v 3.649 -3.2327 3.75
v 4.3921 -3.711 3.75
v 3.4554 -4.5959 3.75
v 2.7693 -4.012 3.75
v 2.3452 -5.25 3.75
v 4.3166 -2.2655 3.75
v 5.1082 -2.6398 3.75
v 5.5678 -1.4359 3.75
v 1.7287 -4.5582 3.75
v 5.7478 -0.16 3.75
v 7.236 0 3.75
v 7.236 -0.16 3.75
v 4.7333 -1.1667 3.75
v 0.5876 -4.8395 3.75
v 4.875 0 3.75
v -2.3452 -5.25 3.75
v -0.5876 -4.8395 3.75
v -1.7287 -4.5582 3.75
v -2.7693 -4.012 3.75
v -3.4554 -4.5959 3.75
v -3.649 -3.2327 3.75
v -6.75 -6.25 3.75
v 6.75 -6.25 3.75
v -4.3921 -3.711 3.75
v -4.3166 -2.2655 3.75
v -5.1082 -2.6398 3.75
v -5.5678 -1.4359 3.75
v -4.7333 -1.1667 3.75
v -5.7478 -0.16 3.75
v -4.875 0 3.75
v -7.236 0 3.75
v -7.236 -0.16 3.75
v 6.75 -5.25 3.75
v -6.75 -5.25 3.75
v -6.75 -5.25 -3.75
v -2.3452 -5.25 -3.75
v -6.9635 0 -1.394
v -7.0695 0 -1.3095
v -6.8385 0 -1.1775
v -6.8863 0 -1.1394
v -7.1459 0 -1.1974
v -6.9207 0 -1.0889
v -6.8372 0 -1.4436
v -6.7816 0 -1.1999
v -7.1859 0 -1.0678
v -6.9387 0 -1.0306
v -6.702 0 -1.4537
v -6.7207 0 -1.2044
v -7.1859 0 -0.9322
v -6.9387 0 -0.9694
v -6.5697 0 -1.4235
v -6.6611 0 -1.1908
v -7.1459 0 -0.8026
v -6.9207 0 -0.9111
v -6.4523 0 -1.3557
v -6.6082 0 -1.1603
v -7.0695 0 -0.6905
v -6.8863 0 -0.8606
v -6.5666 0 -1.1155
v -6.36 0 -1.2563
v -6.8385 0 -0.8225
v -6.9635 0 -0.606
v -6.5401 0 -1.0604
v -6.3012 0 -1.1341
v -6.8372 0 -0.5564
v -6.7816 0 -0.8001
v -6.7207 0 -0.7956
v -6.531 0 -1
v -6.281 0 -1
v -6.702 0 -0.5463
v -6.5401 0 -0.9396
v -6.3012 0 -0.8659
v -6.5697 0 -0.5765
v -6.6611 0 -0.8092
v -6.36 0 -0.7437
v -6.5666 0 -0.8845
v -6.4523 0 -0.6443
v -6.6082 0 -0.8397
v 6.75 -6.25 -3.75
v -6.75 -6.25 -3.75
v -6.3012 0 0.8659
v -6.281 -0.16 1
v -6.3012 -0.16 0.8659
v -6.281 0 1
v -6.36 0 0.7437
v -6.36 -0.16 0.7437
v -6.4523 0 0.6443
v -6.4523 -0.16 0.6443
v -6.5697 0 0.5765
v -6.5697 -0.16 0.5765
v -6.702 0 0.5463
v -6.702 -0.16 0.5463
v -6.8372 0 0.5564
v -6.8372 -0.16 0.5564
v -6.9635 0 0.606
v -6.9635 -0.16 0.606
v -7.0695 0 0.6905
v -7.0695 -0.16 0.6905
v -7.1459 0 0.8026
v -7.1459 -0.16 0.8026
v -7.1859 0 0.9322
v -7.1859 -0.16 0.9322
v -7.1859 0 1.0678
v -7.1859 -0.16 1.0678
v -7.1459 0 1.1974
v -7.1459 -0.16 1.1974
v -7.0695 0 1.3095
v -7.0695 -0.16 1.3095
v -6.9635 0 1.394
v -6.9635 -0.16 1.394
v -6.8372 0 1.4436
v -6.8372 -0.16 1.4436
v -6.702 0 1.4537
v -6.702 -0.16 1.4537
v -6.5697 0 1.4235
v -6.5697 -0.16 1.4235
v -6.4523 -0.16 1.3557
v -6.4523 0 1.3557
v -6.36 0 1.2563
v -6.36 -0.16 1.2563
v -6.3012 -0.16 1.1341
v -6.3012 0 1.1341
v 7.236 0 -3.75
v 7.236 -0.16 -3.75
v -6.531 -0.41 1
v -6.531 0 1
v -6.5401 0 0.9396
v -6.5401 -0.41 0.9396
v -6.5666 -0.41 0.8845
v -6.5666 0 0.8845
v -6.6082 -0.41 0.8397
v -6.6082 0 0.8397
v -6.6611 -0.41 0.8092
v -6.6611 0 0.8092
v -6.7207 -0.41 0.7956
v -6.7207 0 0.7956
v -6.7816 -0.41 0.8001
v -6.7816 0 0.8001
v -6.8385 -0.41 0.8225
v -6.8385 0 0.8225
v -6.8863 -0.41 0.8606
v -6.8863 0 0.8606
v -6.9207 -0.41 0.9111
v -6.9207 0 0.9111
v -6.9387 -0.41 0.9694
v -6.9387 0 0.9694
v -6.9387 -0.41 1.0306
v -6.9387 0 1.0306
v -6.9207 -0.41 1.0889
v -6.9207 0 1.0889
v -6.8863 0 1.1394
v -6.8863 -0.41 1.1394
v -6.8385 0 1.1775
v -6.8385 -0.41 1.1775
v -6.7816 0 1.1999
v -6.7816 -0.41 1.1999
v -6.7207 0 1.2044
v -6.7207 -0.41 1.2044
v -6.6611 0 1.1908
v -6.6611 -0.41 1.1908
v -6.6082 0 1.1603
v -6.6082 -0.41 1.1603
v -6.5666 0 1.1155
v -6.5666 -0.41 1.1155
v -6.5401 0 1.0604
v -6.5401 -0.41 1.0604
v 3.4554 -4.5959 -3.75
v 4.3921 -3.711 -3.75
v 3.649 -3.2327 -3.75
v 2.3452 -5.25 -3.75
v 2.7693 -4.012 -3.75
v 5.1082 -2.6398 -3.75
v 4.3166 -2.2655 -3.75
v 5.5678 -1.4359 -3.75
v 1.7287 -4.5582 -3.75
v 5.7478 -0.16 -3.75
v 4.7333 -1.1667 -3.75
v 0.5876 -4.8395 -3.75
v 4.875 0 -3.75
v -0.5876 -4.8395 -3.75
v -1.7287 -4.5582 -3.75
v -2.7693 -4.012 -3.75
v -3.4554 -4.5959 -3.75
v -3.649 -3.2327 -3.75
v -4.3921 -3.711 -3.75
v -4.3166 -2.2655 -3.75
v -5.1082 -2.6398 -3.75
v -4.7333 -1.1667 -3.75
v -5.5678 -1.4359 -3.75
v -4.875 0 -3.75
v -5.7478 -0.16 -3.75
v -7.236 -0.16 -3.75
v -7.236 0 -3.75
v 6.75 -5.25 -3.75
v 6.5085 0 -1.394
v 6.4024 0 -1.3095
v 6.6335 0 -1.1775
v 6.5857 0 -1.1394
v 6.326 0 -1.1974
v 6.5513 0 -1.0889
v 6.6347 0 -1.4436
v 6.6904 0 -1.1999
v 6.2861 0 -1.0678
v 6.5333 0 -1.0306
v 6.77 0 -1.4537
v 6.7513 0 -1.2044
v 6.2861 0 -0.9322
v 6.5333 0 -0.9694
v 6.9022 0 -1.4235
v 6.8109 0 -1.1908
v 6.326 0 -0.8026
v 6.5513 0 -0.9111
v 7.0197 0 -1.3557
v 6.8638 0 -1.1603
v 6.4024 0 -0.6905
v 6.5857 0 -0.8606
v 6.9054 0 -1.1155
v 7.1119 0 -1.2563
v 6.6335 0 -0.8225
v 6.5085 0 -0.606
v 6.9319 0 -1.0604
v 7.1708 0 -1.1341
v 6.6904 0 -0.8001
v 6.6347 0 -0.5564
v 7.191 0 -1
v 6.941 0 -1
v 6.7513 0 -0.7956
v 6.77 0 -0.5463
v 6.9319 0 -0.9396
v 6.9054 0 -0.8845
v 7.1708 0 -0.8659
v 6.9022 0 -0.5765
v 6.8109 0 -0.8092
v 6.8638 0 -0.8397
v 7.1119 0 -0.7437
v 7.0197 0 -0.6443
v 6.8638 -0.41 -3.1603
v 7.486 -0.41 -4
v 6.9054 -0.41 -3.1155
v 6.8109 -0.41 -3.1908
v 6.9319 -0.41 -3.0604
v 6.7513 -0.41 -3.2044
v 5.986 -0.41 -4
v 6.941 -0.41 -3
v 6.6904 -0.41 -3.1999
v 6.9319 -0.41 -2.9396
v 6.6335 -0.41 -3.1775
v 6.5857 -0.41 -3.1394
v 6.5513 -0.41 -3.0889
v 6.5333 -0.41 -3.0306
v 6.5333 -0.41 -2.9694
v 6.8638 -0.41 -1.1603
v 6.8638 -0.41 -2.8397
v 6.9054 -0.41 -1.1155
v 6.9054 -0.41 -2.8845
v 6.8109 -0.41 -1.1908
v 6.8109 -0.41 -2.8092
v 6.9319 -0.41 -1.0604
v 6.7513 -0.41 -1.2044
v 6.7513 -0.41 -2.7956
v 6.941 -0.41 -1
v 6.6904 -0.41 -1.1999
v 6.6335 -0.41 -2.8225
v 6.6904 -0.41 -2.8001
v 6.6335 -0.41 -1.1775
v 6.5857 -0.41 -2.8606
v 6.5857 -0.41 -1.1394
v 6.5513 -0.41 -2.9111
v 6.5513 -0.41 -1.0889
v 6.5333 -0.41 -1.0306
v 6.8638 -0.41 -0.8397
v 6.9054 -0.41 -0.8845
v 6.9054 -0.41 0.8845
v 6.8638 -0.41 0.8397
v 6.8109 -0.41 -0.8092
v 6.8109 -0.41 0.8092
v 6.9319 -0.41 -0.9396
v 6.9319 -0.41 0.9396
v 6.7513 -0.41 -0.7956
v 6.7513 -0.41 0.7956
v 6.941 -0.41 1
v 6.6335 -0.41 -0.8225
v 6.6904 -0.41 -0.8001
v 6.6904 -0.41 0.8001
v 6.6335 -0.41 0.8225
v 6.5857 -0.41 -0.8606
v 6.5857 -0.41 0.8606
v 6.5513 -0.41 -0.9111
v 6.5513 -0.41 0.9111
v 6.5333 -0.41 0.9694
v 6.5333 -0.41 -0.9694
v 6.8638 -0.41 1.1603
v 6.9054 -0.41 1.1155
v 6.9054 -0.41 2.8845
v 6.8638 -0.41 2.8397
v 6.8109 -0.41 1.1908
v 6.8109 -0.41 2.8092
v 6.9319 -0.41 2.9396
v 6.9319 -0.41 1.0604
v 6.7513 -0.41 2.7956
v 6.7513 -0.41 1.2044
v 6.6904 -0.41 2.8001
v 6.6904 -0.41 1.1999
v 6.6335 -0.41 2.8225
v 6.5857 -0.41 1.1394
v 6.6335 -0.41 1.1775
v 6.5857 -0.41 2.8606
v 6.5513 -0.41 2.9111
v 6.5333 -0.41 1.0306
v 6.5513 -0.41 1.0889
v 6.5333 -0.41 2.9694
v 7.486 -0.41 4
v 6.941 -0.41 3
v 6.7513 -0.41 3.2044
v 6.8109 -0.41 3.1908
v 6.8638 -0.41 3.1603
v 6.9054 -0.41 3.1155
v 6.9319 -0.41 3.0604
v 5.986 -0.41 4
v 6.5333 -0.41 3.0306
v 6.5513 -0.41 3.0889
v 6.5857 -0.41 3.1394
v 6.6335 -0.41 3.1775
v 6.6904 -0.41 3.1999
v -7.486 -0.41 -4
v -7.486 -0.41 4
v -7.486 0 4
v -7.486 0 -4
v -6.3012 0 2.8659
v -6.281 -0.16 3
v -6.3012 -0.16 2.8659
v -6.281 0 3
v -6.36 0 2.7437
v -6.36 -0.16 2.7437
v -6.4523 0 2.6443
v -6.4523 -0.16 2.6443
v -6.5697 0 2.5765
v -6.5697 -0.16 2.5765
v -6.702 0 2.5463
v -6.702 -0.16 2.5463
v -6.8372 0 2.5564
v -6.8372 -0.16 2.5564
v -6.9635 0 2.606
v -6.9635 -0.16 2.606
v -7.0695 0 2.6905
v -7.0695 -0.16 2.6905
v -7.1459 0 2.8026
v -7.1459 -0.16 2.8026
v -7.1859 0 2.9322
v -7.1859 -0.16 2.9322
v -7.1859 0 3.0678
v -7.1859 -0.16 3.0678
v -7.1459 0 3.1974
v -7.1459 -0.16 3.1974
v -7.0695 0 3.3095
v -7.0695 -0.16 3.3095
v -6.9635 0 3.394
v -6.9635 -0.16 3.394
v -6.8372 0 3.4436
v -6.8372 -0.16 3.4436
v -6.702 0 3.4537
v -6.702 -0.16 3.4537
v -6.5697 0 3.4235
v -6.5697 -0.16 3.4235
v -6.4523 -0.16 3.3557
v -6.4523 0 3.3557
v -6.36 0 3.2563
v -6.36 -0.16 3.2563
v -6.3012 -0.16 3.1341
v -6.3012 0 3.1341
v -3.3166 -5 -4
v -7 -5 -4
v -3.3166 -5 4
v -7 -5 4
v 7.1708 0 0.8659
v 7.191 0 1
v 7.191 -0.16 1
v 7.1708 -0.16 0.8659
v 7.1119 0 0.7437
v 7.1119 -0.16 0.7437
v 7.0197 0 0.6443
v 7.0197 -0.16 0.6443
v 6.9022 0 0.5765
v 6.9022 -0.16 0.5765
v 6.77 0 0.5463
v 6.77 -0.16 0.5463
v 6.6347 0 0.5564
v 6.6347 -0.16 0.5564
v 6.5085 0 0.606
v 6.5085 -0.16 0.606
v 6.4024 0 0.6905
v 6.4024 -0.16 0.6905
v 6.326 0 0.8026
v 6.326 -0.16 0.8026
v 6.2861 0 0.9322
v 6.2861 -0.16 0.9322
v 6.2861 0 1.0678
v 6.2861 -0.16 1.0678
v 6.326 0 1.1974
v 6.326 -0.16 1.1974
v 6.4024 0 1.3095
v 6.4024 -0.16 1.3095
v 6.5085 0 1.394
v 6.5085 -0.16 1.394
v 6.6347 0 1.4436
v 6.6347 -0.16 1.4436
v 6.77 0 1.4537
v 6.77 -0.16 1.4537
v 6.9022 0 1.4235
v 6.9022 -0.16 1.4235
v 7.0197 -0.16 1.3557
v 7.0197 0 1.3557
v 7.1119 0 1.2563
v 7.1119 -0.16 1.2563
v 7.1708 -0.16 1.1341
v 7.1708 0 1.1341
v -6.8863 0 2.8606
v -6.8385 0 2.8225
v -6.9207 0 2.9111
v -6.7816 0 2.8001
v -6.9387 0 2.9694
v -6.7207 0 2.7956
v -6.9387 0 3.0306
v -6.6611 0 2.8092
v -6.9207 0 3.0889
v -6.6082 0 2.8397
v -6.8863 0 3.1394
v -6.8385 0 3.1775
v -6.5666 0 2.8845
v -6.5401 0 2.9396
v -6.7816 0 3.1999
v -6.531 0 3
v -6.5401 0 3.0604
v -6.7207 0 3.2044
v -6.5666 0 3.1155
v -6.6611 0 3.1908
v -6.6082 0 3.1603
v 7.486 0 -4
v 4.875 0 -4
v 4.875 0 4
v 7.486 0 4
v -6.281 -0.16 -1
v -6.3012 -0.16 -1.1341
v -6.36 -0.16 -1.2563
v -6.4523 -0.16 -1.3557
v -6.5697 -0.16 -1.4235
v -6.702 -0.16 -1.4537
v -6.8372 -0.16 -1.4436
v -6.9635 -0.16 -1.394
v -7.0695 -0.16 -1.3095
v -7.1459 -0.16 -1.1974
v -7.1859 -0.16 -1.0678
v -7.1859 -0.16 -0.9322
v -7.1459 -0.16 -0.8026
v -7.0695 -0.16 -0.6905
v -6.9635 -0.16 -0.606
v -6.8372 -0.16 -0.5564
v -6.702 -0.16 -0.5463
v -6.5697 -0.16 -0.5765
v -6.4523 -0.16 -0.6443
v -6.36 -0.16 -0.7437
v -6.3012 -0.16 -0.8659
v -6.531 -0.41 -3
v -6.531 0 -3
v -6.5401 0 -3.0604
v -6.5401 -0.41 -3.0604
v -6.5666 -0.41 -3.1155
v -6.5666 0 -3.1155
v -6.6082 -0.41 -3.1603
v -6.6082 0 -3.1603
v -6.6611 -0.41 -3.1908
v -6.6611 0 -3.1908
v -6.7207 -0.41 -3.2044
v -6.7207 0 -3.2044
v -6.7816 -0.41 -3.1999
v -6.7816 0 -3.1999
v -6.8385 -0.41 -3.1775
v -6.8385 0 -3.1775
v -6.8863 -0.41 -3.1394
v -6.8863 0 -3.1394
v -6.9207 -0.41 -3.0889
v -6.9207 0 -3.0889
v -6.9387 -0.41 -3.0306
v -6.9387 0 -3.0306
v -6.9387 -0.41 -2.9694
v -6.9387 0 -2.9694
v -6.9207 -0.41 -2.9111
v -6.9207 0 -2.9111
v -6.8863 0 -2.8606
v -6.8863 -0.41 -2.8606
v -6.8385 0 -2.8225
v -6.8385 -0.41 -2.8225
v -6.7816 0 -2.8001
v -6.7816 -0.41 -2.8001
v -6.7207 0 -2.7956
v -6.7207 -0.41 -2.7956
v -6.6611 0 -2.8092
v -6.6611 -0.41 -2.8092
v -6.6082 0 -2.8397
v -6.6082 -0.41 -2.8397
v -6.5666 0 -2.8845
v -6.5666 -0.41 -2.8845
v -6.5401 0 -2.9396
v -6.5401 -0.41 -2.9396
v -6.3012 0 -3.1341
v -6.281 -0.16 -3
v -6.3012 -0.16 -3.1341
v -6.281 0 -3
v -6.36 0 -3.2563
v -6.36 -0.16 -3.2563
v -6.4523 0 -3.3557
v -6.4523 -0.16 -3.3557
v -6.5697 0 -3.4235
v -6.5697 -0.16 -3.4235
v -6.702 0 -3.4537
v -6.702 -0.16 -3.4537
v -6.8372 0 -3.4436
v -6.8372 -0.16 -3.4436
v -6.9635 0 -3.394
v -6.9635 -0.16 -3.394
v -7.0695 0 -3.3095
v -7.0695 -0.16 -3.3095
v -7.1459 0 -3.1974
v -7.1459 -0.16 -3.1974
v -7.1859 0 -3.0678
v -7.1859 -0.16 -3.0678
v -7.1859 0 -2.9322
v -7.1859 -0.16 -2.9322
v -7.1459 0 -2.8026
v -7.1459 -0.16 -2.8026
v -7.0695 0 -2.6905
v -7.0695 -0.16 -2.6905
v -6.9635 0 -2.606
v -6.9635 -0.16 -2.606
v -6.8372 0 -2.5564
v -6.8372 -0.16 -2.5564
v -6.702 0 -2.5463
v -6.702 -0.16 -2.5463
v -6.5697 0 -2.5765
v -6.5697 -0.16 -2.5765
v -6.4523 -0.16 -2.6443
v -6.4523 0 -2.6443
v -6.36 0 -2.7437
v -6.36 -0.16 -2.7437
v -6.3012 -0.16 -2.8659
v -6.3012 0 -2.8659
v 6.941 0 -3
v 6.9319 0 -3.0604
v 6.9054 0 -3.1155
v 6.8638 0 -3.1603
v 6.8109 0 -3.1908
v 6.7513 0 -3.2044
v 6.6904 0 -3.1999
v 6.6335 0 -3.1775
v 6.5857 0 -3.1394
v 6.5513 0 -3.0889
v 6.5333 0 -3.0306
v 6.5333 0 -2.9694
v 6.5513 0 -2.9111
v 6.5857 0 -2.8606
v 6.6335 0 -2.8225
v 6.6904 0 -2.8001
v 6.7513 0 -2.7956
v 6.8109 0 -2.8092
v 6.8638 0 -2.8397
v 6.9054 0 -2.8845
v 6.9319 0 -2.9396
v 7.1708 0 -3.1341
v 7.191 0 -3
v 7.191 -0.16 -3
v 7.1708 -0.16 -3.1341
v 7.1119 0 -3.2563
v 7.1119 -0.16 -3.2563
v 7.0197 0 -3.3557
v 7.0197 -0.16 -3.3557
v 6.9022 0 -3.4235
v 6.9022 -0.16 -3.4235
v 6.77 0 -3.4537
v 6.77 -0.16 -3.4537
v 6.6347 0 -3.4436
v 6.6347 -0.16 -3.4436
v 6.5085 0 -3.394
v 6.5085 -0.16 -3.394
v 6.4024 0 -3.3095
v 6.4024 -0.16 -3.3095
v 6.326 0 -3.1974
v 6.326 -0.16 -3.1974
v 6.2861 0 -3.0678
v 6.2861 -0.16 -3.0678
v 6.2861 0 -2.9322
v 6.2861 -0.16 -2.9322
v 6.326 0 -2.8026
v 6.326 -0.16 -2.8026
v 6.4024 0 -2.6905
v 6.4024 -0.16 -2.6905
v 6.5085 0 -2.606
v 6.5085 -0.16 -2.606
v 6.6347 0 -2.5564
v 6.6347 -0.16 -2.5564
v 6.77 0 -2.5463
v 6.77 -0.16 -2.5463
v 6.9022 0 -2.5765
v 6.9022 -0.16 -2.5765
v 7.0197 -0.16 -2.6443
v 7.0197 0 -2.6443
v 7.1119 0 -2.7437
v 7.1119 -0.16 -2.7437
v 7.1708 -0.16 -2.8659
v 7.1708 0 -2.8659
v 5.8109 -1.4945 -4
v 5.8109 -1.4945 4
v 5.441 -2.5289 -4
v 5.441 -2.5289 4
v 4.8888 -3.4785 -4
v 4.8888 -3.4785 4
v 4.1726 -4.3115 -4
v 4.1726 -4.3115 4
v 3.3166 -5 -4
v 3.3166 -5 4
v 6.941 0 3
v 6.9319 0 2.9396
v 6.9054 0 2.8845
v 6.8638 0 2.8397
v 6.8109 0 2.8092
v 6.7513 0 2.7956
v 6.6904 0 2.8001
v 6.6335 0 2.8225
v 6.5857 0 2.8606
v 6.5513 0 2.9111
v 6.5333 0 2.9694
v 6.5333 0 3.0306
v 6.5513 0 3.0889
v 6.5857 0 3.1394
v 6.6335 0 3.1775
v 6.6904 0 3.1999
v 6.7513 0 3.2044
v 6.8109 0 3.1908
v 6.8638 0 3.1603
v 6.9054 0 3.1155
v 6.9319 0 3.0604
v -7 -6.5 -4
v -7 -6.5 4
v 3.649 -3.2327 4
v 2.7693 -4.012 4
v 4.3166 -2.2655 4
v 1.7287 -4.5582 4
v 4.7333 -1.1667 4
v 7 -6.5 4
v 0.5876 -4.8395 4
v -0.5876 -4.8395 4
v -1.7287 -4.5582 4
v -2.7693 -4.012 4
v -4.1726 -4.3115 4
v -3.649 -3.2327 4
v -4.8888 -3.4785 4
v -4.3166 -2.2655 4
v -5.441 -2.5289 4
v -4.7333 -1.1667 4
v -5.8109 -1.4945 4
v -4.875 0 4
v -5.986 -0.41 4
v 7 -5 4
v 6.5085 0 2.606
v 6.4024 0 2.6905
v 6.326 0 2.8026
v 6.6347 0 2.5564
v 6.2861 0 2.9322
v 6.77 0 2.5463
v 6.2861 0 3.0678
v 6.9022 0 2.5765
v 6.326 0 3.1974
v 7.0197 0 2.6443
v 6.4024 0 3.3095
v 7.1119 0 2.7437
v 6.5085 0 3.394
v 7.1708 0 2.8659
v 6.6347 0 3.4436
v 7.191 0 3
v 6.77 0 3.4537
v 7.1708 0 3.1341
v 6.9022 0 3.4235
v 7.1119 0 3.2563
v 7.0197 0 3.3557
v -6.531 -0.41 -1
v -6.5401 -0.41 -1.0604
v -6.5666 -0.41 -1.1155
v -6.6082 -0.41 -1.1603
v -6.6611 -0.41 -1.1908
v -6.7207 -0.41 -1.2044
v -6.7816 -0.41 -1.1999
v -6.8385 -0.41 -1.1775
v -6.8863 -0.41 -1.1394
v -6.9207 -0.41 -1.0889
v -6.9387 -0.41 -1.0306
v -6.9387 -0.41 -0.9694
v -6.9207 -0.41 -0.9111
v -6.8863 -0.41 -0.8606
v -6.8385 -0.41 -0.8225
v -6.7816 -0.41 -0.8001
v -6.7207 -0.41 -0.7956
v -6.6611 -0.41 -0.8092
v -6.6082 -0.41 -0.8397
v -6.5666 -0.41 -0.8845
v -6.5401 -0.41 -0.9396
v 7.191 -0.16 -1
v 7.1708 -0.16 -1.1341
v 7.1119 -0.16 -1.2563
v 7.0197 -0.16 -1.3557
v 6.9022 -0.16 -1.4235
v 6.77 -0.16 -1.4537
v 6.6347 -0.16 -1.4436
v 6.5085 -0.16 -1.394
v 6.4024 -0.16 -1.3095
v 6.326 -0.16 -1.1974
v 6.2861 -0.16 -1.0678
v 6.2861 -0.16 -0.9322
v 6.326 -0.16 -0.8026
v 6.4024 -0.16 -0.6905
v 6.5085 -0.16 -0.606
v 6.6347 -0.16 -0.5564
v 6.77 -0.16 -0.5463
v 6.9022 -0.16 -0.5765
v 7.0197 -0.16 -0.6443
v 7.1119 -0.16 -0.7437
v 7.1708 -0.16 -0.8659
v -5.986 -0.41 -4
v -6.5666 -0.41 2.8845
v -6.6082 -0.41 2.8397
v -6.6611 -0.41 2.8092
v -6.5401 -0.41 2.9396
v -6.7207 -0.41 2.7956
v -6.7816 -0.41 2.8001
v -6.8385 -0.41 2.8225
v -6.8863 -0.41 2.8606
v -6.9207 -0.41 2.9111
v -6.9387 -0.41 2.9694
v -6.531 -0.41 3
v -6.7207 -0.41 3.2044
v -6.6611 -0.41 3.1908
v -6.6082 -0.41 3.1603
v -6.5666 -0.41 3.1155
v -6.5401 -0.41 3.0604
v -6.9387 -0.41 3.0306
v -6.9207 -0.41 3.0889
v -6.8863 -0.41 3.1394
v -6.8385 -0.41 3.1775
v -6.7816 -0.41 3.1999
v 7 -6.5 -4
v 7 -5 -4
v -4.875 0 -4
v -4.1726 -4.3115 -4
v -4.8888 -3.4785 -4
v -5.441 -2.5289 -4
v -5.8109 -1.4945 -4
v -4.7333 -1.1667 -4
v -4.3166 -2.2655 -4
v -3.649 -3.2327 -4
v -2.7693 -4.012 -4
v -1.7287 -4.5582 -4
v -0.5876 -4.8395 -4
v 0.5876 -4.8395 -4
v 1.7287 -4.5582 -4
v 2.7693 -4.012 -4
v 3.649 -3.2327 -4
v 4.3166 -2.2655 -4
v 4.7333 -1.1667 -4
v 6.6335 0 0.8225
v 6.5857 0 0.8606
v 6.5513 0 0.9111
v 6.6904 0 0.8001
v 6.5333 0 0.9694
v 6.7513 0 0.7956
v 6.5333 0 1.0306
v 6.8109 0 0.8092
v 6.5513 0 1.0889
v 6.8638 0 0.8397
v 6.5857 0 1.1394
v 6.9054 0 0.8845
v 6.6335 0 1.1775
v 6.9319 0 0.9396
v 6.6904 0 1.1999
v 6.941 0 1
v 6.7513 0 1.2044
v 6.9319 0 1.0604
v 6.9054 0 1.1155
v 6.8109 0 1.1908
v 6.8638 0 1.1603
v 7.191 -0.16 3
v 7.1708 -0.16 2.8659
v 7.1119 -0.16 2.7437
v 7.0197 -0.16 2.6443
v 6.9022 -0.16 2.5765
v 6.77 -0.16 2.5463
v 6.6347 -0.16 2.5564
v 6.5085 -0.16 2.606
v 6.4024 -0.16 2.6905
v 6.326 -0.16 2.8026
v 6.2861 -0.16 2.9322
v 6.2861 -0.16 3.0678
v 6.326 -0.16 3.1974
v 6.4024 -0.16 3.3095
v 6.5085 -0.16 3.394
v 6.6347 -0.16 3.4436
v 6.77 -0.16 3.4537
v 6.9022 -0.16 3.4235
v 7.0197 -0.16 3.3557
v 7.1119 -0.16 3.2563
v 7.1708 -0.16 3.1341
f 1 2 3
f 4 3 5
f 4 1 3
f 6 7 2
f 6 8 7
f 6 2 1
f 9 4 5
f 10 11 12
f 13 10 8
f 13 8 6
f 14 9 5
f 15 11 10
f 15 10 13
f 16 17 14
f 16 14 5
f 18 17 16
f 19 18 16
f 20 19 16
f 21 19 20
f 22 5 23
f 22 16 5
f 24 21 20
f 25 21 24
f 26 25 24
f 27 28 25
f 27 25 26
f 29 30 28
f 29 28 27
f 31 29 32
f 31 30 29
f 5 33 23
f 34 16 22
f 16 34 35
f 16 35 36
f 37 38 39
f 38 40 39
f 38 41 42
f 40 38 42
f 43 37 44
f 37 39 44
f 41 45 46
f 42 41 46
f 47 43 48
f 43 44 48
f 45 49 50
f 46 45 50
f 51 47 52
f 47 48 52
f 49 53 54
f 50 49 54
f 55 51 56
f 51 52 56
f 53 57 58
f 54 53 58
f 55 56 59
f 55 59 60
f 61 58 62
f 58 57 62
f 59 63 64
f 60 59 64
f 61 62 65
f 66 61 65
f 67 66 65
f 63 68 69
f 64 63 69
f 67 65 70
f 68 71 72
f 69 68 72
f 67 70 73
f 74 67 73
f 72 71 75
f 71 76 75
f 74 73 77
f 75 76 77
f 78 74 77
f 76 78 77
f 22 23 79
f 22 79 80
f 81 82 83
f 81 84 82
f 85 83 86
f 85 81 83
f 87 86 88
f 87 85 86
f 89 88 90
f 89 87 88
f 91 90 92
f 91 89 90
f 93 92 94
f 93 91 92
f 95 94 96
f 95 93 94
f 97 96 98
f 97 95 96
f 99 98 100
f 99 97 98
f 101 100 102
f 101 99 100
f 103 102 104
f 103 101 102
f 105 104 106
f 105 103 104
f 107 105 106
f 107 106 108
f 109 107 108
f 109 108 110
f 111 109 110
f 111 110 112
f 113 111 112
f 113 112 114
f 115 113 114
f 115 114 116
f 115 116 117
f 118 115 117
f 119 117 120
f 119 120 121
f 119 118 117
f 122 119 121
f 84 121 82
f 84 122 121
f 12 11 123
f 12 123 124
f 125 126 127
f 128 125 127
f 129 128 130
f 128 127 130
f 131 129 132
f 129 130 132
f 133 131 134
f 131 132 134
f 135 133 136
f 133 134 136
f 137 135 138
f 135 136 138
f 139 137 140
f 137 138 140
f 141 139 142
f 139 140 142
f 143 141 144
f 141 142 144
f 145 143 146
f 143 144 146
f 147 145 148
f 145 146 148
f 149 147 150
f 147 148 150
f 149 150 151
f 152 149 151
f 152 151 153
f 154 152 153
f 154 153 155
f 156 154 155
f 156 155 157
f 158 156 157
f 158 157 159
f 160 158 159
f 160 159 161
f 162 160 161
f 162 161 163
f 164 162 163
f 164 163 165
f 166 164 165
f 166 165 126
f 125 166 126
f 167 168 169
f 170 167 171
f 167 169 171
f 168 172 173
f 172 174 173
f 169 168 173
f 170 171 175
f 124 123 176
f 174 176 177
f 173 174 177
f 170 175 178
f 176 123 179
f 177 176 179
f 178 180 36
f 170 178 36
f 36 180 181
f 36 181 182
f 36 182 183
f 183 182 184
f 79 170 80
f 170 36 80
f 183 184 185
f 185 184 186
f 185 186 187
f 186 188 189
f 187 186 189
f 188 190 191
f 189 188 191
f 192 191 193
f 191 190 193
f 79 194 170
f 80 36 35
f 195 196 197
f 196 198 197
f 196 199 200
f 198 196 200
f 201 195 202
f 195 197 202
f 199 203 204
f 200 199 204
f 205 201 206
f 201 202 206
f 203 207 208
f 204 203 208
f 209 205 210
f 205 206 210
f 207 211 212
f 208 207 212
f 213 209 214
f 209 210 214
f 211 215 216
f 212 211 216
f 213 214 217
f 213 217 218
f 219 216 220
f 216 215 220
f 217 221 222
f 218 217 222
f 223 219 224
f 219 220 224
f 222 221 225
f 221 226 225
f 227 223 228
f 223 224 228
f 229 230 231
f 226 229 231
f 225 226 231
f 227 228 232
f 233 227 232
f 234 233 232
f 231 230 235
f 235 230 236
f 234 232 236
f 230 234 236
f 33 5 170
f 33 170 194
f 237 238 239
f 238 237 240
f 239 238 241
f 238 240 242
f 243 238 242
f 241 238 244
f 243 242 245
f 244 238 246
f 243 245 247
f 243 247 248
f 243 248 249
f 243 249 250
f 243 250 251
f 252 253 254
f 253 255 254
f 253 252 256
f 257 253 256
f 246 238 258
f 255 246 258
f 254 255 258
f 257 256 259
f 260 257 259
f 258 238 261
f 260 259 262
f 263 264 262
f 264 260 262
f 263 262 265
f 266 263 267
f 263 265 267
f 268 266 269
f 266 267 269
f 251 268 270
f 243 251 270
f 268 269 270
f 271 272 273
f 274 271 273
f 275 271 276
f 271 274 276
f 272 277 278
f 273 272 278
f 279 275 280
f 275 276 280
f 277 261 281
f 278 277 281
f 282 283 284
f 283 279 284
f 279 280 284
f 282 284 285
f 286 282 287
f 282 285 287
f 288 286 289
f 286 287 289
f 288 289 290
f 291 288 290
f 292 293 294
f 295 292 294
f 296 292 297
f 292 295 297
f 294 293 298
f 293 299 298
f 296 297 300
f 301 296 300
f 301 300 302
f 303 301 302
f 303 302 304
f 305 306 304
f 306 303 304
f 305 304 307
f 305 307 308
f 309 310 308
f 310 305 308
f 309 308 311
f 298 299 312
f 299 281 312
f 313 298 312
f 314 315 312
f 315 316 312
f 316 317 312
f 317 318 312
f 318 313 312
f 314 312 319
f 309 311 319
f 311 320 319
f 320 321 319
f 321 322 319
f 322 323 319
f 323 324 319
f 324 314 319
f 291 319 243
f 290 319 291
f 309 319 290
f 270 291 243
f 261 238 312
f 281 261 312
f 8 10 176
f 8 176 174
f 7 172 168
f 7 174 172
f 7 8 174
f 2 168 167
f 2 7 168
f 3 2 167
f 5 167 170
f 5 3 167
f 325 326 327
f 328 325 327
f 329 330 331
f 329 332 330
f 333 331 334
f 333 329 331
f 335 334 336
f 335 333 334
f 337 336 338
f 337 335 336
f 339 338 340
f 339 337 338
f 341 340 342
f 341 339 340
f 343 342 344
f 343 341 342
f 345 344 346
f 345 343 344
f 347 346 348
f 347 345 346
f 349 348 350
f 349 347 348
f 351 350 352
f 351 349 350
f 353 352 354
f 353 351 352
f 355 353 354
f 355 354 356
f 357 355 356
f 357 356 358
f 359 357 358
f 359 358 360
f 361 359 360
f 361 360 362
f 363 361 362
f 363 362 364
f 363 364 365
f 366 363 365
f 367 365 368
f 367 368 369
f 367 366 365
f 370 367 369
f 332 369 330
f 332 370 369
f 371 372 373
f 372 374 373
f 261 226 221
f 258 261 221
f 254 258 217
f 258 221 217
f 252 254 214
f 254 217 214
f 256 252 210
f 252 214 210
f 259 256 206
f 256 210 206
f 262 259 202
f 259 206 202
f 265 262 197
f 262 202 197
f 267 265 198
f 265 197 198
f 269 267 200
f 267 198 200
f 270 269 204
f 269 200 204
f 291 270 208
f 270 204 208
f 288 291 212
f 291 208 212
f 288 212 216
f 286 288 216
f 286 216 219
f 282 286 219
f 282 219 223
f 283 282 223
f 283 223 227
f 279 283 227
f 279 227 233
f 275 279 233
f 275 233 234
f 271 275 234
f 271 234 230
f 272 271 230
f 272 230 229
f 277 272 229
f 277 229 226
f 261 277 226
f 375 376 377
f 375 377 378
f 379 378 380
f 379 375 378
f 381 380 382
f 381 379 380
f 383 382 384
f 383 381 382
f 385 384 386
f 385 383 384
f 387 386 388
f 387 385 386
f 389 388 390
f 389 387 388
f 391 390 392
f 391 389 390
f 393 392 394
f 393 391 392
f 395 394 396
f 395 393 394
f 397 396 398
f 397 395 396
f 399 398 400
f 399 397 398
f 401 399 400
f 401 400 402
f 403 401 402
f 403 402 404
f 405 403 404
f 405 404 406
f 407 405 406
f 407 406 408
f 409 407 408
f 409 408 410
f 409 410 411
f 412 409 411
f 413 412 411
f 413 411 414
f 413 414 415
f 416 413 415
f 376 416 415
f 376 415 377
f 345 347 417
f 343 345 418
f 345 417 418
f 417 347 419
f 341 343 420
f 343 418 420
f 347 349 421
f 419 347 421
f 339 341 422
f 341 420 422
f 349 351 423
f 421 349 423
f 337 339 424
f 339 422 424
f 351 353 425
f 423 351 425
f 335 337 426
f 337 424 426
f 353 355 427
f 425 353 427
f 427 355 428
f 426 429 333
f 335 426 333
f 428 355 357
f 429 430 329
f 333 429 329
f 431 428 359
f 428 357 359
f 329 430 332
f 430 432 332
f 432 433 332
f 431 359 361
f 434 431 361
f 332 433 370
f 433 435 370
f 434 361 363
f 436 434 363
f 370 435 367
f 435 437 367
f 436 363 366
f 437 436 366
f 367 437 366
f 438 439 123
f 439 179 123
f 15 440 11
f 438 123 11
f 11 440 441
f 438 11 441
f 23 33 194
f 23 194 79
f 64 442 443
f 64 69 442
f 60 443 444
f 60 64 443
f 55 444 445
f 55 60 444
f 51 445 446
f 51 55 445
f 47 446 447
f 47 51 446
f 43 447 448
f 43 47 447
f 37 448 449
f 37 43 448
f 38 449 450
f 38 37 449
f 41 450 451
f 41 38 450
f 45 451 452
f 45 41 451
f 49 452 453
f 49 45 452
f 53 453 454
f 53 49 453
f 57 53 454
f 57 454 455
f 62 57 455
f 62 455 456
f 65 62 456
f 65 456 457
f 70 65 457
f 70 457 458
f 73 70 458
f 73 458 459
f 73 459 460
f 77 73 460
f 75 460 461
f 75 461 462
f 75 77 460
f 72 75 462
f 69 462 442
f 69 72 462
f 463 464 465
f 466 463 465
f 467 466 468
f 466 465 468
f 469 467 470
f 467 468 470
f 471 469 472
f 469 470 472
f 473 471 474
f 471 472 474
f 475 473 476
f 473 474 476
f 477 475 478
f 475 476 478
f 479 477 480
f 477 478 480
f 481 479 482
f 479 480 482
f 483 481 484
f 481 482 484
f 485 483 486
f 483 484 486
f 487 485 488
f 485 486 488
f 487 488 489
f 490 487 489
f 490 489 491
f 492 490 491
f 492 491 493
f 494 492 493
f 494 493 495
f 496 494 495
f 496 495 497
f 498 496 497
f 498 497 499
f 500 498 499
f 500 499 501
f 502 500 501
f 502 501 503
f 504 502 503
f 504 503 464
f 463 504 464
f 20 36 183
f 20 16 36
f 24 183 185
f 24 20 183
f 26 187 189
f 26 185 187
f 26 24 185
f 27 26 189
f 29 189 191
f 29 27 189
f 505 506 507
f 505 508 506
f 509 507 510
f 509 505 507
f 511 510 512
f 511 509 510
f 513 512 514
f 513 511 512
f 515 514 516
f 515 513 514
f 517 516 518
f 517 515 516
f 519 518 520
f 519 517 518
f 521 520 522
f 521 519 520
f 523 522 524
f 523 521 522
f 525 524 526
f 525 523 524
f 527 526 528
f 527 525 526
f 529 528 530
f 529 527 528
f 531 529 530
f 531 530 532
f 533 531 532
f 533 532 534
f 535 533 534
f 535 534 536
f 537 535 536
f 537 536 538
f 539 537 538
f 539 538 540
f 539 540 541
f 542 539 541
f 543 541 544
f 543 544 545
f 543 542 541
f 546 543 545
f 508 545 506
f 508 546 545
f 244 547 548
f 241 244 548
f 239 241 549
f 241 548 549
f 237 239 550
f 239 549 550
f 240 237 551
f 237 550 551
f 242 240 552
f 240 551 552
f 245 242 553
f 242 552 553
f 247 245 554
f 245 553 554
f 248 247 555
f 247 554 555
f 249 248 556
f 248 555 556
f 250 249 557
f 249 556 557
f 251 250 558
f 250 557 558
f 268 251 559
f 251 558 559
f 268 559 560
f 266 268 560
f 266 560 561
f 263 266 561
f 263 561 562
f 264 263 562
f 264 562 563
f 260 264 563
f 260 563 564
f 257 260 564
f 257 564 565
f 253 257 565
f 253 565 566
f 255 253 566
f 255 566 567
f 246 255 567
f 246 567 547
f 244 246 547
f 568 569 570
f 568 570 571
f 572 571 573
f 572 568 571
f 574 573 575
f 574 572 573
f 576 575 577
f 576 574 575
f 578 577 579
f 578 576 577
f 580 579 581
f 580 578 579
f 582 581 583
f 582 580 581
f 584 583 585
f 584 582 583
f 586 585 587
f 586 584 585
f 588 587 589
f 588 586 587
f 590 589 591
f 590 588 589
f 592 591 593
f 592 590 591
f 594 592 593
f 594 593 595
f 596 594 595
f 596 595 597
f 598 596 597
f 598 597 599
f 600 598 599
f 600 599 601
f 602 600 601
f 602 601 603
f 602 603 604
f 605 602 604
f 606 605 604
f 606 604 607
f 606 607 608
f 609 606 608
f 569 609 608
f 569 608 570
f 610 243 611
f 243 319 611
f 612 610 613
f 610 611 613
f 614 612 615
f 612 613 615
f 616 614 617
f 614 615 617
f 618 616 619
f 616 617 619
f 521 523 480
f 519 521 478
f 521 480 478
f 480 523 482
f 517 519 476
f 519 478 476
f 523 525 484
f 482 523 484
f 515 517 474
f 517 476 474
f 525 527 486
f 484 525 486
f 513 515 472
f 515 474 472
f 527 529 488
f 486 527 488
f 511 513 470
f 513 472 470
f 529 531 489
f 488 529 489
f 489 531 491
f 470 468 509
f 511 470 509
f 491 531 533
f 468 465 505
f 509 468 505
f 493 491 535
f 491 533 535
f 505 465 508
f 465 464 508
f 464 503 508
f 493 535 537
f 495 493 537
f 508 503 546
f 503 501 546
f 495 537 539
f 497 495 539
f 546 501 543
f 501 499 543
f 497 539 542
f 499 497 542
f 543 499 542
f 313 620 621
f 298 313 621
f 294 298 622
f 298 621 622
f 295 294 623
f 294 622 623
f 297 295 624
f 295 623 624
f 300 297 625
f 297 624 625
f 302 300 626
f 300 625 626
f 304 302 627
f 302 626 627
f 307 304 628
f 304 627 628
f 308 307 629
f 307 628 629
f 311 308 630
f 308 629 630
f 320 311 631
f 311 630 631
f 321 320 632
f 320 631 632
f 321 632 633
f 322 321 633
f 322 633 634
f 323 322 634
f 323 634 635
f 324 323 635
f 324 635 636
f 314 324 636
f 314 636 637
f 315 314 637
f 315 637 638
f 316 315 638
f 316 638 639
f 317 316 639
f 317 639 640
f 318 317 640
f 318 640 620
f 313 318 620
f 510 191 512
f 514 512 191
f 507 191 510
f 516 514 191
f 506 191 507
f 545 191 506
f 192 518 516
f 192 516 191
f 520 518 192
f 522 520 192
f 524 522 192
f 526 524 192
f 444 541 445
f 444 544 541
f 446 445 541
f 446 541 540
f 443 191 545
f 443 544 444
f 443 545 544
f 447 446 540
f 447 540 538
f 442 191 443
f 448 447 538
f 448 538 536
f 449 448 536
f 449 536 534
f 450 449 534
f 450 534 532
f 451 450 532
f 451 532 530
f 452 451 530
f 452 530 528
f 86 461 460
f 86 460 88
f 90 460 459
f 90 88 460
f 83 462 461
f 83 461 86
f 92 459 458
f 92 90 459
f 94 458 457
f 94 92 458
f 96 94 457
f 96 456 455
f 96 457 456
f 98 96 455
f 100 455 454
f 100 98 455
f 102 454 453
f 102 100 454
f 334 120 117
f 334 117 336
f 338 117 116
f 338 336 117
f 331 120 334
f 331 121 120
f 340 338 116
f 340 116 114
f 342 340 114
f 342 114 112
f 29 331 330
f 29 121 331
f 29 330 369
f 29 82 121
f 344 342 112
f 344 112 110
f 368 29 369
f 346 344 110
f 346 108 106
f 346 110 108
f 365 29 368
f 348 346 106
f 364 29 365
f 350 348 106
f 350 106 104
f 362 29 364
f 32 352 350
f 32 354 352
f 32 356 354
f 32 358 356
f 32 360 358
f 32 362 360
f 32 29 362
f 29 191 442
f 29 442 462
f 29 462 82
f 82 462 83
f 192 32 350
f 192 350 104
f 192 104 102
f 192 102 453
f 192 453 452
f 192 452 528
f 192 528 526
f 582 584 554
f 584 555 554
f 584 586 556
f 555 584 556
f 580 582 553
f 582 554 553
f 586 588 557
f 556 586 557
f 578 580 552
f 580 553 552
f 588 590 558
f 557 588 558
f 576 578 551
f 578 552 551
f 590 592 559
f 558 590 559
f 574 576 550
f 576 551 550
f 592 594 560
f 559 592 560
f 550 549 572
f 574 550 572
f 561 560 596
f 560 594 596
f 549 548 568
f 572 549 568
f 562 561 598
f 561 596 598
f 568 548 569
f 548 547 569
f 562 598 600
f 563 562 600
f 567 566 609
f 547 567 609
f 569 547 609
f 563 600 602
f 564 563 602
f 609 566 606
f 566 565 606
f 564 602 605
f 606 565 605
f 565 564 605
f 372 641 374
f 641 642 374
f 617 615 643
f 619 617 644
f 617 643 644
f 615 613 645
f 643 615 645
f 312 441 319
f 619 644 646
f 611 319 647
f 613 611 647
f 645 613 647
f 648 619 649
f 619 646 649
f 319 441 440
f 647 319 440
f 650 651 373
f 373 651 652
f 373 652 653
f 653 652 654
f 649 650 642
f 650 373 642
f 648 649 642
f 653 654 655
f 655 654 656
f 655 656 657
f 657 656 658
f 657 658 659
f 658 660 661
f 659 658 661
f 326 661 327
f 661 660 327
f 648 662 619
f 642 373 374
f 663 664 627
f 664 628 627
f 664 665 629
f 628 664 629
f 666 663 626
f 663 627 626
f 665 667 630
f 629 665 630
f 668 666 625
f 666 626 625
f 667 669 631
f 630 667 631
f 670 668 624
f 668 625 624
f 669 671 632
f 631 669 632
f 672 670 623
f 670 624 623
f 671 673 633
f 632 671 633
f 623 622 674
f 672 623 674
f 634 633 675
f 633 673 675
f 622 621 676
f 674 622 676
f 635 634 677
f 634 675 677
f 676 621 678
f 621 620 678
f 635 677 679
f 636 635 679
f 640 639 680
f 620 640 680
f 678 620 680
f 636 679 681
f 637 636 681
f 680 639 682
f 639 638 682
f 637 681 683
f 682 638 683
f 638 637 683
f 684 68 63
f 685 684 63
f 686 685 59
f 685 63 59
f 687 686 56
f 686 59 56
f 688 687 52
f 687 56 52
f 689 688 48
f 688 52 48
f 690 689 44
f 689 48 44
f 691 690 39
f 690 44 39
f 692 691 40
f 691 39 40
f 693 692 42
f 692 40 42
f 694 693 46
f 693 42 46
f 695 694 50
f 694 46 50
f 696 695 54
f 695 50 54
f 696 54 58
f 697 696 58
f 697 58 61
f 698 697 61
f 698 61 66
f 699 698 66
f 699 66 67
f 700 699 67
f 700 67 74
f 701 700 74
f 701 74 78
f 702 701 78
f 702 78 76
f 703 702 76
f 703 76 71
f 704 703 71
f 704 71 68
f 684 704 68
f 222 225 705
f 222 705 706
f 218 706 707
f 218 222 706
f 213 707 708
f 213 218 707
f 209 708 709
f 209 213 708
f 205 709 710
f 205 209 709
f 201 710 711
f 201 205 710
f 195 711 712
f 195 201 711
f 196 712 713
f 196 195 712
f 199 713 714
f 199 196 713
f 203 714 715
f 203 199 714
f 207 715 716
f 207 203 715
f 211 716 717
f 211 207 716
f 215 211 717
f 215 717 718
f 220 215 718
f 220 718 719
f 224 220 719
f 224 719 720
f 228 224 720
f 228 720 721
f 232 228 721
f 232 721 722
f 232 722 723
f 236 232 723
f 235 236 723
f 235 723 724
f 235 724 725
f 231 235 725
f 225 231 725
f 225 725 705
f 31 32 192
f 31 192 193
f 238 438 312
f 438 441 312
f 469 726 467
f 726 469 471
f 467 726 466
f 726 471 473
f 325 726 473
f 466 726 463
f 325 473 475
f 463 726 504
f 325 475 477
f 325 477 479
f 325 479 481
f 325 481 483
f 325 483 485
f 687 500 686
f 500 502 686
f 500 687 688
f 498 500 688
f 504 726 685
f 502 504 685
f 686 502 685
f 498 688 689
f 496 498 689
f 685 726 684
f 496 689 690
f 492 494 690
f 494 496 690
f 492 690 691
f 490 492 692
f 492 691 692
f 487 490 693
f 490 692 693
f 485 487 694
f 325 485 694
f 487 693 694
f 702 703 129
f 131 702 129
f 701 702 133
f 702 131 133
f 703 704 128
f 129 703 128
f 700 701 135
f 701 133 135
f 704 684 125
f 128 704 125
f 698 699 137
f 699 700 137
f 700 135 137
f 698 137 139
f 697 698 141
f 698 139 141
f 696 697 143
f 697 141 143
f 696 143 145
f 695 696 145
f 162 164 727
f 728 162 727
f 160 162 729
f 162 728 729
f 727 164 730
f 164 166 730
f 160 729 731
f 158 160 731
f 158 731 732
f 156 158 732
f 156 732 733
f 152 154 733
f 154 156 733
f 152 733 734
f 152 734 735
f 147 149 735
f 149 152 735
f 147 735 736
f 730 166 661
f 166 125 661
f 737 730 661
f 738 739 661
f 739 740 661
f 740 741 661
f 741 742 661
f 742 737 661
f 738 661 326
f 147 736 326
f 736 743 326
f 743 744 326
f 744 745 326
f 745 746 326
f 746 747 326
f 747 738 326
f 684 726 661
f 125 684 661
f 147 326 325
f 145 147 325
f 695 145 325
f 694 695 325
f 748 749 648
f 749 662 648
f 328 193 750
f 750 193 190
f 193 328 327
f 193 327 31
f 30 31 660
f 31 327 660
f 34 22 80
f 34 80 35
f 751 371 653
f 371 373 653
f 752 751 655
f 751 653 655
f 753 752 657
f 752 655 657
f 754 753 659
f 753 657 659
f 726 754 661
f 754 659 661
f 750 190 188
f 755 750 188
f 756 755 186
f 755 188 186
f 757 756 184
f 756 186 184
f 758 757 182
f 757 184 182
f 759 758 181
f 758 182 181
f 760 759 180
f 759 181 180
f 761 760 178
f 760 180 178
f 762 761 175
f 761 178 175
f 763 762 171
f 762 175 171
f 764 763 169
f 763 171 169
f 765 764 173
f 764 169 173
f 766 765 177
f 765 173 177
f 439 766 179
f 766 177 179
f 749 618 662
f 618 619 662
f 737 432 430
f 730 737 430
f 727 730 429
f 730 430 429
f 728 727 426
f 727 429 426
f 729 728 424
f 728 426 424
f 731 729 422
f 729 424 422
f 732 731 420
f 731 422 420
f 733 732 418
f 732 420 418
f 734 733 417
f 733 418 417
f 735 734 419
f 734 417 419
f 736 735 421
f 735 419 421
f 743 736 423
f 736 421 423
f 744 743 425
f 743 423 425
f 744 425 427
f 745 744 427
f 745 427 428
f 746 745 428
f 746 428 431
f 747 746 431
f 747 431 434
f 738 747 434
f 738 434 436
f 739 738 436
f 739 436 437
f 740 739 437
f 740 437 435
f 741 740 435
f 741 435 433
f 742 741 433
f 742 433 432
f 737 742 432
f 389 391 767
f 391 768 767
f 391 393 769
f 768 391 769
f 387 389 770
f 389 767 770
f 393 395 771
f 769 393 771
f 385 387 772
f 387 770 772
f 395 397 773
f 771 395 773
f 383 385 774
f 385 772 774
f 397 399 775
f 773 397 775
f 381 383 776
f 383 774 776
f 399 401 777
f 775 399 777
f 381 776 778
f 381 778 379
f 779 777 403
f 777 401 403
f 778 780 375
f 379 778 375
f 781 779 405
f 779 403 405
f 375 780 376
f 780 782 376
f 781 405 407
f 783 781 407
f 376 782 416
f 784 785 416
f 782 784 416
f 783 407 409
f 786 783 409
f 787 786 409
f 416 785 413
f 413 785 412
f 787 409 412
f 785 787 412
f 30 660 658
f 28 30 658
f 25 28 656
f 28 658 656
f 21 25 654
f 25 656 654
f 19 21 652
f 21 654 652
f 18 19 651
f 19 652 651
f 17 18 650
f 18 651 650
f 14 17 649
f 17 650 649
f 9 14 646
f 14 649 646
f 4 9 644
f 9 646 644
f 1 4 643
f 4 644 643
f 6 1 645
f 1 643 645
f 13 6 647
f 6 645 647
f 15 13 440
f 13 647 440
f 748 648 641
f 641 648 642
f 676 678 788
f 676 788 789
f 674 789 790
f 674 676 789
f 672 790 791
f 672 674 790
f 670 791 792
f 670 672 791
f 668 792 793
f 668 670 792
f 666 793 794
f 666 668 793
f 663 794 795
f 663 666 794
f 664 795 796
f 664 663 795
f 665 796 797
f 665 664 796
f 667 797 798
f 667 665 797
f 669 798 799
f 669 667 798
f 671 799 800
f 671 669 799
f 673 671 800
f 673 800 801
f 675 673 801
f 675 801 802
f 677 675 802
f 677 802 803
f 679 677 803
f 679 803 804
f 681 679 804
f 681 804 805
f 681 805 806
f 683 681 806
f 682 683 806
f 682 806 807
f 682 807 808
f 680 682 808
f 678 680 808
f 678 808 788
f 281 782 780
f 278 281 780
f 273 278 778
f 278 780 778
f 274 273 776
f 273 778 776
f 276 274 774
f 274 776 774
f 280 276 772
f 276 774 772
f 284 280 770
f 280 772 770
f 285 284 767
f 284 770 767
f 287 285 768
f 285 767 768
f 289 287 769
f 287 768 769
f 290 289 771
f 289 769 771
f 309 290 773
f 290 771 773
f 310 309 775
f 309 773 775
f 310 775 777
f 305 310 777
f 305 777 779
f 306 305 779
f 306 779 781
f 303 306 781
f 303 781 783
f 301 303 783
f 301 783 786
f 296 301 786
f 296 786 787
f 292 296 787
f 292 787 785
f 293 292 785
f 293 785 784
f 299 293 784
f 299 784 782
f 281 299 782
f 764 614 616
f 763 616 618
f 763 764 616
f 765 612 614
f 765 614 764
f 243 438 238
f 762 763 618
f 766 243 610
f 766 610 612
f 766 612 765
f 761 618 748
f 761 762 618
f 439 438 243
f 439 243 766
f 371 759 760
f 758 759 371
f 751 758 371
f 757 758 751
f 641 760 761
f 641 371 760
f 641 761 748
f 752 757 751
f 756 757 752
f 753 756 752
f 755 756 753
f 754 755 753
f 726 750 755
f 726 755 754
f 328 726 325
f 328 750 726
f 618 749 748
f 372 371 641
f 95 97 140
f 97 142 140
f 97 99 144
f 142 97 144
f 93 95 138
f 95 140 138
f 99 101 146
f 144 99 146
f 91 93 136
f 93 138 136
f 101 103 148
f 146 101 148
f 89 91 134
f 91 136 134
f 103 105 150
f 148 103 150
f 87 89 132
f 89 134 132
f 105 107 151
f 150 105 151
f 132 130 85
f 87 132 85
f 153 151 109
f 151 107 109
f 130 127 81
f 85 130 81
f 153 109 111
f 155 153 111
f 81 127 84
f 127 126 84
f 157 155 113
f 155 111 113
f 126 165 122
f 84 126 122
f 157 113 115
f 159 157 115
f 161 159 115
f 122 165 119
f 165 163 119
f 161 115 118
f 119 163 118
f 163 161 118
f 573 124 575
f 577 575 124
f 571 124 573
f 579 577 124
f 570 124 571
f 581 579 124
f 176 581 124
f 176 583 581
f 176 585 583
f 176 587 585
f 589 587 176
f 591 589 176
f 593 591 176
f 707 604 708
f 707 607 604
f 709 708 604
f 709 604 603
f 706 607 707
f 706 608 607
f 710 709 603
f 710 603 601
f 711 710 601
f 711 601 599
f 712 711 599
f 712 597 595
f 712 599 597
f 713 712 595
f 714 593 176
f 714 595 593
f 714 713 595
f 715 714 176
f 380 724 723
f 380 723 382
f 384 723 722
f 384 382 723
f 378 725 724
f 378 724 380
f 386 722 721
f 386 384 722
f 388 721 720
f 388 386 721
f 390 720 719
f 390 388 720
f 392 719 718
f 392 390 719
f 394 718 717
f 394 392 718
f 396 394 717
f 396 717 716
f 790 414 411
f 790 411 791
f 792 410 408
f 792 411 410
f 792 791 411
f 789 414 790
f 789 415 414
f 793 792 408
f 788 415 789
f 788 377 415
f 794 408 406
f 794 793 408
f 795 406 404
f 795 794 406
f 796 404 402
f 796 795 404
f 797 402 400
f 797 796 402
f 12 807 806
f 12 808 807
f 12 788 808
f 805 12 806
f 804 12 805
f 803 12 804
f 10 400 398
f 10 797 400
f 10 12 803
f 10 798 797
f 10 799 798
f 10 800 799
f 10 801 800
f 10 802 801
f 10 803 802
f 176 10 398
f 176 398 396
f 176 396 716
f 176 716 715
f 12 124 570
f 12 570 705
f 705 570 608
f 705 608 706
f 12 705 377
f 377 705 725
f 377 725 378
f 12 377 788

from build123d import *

# Parameters (mm, degrees)
BOSS_EXTRUDE2_DEPTH = 4
CUT_EXTRUDE2_REACH  = 8.5
SKETCH3_R           = 0.205
SHELL1_T            = -0.25


with BuildPart() as part:
    # Sketch1 → Boss-Extrude2 (new body, symmetric)
    with BuildSketch(Plane.XY):
        with BuildLine():
            Line((-7.485975276, 0), (-4.875, 0))
            ThreePointArc((-4.875, 0), (0, -4.875), (4.875, 0))
            Line((4.875, 0), (7.485975276, 0))
            Line((7.485975276, 0), (7.485975276, -0.41))
            Line((7.485975276, -0.41), (5.985975276, -0.41))
            ThreePointArc((5.985975276, -0.41), (5.186676874, -3.016352599), (3.31662479, -5))
            Line((3.31662479, -5), (7, -5))
            Line((7, -5), (7, -6.5))
            Line((7, -6.5), (-7, -6.5))
            Line((-7, -6.5), (-7, -5))
            Line((-7, -5), (-3.31662479, -5))
            ThreePointArc((-3.31662479, -5), (-5.186676874, -3.016352599), (-5.985975276, -0.41))
            Line((-5.985975276, -0.41), (-7.485975276, -0.41))
            Line((-7.485975276, -0.41), (-7.485975276, 0))
        make_face()
    extrude(amount=BOSS_EXTRUDE2_DEPTH, both=True)

    # Sketch3 → Cut-Extrude2 (cut, up to next)
    with BuildSketch(Plane(origin=(0, 0, 0), x_dir=(1, 0, 0), z_dir=(0, 1, 0)), mode=Mode.PRIVATE) as cut_extrude2_sk1:
        with Locations((-6.735975276, 3)):
            Circle(SKETCH3_R)
    cut_extrude2_tool1 = extrude(cut_extrude2_sk1.sketch, amount=-CUT_EXTRUDE2_REACH, mode=Mode.PRIVATE) & part.part
    add(cut_extrude2_tool1.solids().sort_by_distance((-6.735975, 0, -3))[0], mode=Mode.SUBTRACT)
    # Sketch3 → Cut-Extrude2 (cut, up to next)
    with BuildSketch(Plane(origin=(0, 0, 0), x_dir=(1, 0, 0), z_dir=(0, 1, 0)), mode=Mode.PRIVATE) as cut_extrude2_sk2:
        with Locations((-6.735975276, 1)):
            Circle(SKETCH3_R)
    cut_extrude2_tool2 = extrude(cut_extrude2_sk2.sketch, amount=-CUT_EXTRUDE2_REACH, mode=Mode.PRIVATE) & part.part
    add(cut_extrude2_tool2.solids().sort_by_distance((-6.735975, 0, -1))[0], mode=Mode.SUBTRACT)
    # Sketch3 → Cut-Extrude2 (cut, up to next)
    with BuildSketch(Plane(origin=(0, 0, 0), x_dir=(1, 0, 0), z_dir=(0, 1, 0)), mode=Mode.PRIVATE) as cut_extrude2_sk3:
        with Locations((-6.735975276, -1)):
            Circle(SKETCH3_R)
    cut_extrude2_tool3 = extrude(cut_extrude2_sk3.sketch, amount=-CUT_EXTRUDE2_REACH, mode=Mode.PRIVATE) & part.part
    add(cut_extrude2_tool3.solids().sort_by_distance((-6.735975, 0, 1))[0], mode=Mode.SUBTRACT)
    # Sketch3 → Cut-Extrude2 (cut, up to next)
    with BuildSketch(Plane(origin=(0, 0, 0), x_dir=(1, 0, 0), z_dir=(0, 1, 0)), mode=Mode.PRIVATE) as cut_extrude2_sk4:
        with Locations((-6.735975276, -3)):
            Circle(SKETCH3_R)
    cut_extrude2_tool4 = extrude(cut_extrude2_sk4.sketch, amount=-CUT_EXTRUDE2_REACH, mode=Mode.PRIVATE) & part.part
    add(cut_extrude2_tool4.solids().sort_by_distance((-6.735975, 0, 3))[0], mode=Mode.SUBTRACT)
    # Sketch3 → Cut-Extrude2 (cut, up to next)
    with BuildSketch(Plane(origin=(0, 0, 0), x_dir=(1, 0, 0), z_dir=(0, 1, 0)), mode=Mode.PRIVATE) as cut_extrude2_sk5:
        with Locations((6.735975276, -3)):
            Circle(SKETCH3_R)
    cut_extrude2_tool5 = extrude(cut_extrude2_sk5.sketch, amount=-CUT_EXTRUDE2_REACH, mode=Mode.PRIVATE) & part.part
    add(cut_extrude2_tool5.solids().sort_by_distance((6.735975, 0, 3))[0], mode=Mode.SUBTRACT)
    # Sketch3 → Cut-Extrude2 (cut, up to next)
    with BuildSketch(Plane(origin=(0, 0, 0), x_dir=(1, 0, 0), z_dir=(0, 1, 0)), mode=Mode.PRIVATE) as cut_extrude2_sk6:
        with Locations((6.735975276, -1)):
            Circle(SKETCH3_R)
    cut_extrude2_tool6 = extrude(cut_extrude2_sk6.sketch, amount=-CUT_EXTRUDE2_REACH, mode=Mode.PRIVATE) & part.part
    add(cut_extrude2_tool6.solids().sort_by_distance((6.735975, 0, 1))[0], mode=Mode.SUBTRACT)
    # Sketch3 → Cut-Extrude2 (cut, up to next)
    with BuildSketch(Plane(origin=(0, 0, 0), x_dir=(1, 0, 0), z_dir=(0, 1, 0)), mode=Mode.PRIVATE) as cut_extrude2_sk7:
        with Locations((6.735975276, 1)):
            Circle(SKETCH3_R)
    cut_extrude2_tool7 = extrude(cut_extrude2_sk7.sketch, amount=-CUT_EXTRUDE2_REACH, mode=Mode.PRIVATE) & part.part
    add(cut_extrude2_tool7.solids().sort_by_distance((6.735975, 0, -1))[0], mode=Mode.SUBTRACT)
    # Sketch3 → Cut-Extrude2 (cut, up to next)
    with BuildSketch(Plane(origin=(0, 0, 0), x_dir=(1, 0, 0), z_dir=(0, 1, 0)), mode=Mode.PRIVATE) as cut_extrude2_sk8:
        with Locations((6.735975276, 3)):
            Circle(SKETCH3_R)
    cut_extrude2_tool8 = extrude(cut_extrude2_sk8.sketch, amount=-CUT_EXTRUDE2_REACH, mode=Mode.PRIVATE) & part.part
    add(cut_extrude2_tool8.solids().sort_by_distance((6.735975, 0, -3))[0], mode=Mode.SUBTRACT)

    # Shell1
    shell1_openings = [part.faces().sort_by_distance(p)[0] for p in [
        (-6.735975276, 0, -0.795),
        (0, -2.4375, 0),
        (6.735975276, 0, 2.795),
    ]]
    offset(amount=SHELL1_T, openings=shell1_openings, kind=Kind.INTERSECTION)


solid = part.part
